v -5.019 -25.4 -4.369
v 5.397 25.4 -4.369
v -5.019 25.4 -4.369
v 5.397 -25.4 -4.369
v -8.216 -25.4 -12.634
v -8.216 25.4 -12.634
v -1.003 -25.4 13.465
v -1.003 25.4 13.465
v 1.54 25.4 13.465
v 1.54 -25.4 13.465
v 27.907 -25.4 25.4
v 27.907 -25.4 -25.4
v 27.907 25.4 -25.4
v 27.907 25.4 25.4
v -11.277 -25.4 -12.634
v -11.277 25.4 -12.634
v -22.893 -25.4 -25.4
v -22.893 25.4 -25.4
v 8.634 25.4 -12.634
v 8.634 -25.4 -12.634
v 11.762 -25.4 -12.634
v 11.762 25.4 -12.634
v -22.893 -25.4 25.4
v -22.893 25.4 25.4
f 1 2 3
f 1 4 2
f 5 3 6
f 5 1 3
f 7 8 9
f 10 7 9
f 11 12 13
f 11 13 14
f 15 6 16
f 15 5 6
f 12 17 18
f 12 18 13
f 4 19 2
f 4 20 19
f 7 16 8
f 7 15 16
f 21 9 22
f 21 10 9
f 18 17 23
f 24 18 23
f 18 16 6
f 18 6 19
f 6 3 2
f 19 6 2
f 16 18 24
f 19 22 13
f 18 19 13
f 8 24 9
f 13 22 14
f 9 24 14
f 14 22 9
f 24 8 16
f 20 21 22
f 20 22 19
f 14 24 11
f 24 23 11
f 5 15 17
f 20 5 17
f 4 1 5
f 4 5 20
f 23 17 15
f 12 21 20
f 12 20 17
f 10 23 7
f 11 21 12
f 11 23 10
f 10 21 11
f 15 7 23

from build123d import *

# Parameters (mm, degrees)
F0_W     = 50.8
F0_H     = 50.8
F1_DEPTH = 25.4


with BuildPart() as f1:
    # F0 (on Front) → F1 (new body, symmetric)
    with BuildSketch(Plane.XZ):
        with Locations((2.5065707316, 0)):
            Rectangle(F0_W, F0_H)
        Polygon((11.7624275368, -12.6344077289), (8.6336481415, -12.6344077289), (5.3967836399, -4.3687414355), (-5.0192074016, -4.3687414355), (-8.2162510746, -12.6344077289), (-11.2767661922, -12.6344077289), (-1.002992396, 13.4653011177), (1.5398519489, 13.4653011177), align=None, mode=Mode.SUBTRACT)
    extrude(amount=F1_DEPTH, both=True)


solid = f1.part
